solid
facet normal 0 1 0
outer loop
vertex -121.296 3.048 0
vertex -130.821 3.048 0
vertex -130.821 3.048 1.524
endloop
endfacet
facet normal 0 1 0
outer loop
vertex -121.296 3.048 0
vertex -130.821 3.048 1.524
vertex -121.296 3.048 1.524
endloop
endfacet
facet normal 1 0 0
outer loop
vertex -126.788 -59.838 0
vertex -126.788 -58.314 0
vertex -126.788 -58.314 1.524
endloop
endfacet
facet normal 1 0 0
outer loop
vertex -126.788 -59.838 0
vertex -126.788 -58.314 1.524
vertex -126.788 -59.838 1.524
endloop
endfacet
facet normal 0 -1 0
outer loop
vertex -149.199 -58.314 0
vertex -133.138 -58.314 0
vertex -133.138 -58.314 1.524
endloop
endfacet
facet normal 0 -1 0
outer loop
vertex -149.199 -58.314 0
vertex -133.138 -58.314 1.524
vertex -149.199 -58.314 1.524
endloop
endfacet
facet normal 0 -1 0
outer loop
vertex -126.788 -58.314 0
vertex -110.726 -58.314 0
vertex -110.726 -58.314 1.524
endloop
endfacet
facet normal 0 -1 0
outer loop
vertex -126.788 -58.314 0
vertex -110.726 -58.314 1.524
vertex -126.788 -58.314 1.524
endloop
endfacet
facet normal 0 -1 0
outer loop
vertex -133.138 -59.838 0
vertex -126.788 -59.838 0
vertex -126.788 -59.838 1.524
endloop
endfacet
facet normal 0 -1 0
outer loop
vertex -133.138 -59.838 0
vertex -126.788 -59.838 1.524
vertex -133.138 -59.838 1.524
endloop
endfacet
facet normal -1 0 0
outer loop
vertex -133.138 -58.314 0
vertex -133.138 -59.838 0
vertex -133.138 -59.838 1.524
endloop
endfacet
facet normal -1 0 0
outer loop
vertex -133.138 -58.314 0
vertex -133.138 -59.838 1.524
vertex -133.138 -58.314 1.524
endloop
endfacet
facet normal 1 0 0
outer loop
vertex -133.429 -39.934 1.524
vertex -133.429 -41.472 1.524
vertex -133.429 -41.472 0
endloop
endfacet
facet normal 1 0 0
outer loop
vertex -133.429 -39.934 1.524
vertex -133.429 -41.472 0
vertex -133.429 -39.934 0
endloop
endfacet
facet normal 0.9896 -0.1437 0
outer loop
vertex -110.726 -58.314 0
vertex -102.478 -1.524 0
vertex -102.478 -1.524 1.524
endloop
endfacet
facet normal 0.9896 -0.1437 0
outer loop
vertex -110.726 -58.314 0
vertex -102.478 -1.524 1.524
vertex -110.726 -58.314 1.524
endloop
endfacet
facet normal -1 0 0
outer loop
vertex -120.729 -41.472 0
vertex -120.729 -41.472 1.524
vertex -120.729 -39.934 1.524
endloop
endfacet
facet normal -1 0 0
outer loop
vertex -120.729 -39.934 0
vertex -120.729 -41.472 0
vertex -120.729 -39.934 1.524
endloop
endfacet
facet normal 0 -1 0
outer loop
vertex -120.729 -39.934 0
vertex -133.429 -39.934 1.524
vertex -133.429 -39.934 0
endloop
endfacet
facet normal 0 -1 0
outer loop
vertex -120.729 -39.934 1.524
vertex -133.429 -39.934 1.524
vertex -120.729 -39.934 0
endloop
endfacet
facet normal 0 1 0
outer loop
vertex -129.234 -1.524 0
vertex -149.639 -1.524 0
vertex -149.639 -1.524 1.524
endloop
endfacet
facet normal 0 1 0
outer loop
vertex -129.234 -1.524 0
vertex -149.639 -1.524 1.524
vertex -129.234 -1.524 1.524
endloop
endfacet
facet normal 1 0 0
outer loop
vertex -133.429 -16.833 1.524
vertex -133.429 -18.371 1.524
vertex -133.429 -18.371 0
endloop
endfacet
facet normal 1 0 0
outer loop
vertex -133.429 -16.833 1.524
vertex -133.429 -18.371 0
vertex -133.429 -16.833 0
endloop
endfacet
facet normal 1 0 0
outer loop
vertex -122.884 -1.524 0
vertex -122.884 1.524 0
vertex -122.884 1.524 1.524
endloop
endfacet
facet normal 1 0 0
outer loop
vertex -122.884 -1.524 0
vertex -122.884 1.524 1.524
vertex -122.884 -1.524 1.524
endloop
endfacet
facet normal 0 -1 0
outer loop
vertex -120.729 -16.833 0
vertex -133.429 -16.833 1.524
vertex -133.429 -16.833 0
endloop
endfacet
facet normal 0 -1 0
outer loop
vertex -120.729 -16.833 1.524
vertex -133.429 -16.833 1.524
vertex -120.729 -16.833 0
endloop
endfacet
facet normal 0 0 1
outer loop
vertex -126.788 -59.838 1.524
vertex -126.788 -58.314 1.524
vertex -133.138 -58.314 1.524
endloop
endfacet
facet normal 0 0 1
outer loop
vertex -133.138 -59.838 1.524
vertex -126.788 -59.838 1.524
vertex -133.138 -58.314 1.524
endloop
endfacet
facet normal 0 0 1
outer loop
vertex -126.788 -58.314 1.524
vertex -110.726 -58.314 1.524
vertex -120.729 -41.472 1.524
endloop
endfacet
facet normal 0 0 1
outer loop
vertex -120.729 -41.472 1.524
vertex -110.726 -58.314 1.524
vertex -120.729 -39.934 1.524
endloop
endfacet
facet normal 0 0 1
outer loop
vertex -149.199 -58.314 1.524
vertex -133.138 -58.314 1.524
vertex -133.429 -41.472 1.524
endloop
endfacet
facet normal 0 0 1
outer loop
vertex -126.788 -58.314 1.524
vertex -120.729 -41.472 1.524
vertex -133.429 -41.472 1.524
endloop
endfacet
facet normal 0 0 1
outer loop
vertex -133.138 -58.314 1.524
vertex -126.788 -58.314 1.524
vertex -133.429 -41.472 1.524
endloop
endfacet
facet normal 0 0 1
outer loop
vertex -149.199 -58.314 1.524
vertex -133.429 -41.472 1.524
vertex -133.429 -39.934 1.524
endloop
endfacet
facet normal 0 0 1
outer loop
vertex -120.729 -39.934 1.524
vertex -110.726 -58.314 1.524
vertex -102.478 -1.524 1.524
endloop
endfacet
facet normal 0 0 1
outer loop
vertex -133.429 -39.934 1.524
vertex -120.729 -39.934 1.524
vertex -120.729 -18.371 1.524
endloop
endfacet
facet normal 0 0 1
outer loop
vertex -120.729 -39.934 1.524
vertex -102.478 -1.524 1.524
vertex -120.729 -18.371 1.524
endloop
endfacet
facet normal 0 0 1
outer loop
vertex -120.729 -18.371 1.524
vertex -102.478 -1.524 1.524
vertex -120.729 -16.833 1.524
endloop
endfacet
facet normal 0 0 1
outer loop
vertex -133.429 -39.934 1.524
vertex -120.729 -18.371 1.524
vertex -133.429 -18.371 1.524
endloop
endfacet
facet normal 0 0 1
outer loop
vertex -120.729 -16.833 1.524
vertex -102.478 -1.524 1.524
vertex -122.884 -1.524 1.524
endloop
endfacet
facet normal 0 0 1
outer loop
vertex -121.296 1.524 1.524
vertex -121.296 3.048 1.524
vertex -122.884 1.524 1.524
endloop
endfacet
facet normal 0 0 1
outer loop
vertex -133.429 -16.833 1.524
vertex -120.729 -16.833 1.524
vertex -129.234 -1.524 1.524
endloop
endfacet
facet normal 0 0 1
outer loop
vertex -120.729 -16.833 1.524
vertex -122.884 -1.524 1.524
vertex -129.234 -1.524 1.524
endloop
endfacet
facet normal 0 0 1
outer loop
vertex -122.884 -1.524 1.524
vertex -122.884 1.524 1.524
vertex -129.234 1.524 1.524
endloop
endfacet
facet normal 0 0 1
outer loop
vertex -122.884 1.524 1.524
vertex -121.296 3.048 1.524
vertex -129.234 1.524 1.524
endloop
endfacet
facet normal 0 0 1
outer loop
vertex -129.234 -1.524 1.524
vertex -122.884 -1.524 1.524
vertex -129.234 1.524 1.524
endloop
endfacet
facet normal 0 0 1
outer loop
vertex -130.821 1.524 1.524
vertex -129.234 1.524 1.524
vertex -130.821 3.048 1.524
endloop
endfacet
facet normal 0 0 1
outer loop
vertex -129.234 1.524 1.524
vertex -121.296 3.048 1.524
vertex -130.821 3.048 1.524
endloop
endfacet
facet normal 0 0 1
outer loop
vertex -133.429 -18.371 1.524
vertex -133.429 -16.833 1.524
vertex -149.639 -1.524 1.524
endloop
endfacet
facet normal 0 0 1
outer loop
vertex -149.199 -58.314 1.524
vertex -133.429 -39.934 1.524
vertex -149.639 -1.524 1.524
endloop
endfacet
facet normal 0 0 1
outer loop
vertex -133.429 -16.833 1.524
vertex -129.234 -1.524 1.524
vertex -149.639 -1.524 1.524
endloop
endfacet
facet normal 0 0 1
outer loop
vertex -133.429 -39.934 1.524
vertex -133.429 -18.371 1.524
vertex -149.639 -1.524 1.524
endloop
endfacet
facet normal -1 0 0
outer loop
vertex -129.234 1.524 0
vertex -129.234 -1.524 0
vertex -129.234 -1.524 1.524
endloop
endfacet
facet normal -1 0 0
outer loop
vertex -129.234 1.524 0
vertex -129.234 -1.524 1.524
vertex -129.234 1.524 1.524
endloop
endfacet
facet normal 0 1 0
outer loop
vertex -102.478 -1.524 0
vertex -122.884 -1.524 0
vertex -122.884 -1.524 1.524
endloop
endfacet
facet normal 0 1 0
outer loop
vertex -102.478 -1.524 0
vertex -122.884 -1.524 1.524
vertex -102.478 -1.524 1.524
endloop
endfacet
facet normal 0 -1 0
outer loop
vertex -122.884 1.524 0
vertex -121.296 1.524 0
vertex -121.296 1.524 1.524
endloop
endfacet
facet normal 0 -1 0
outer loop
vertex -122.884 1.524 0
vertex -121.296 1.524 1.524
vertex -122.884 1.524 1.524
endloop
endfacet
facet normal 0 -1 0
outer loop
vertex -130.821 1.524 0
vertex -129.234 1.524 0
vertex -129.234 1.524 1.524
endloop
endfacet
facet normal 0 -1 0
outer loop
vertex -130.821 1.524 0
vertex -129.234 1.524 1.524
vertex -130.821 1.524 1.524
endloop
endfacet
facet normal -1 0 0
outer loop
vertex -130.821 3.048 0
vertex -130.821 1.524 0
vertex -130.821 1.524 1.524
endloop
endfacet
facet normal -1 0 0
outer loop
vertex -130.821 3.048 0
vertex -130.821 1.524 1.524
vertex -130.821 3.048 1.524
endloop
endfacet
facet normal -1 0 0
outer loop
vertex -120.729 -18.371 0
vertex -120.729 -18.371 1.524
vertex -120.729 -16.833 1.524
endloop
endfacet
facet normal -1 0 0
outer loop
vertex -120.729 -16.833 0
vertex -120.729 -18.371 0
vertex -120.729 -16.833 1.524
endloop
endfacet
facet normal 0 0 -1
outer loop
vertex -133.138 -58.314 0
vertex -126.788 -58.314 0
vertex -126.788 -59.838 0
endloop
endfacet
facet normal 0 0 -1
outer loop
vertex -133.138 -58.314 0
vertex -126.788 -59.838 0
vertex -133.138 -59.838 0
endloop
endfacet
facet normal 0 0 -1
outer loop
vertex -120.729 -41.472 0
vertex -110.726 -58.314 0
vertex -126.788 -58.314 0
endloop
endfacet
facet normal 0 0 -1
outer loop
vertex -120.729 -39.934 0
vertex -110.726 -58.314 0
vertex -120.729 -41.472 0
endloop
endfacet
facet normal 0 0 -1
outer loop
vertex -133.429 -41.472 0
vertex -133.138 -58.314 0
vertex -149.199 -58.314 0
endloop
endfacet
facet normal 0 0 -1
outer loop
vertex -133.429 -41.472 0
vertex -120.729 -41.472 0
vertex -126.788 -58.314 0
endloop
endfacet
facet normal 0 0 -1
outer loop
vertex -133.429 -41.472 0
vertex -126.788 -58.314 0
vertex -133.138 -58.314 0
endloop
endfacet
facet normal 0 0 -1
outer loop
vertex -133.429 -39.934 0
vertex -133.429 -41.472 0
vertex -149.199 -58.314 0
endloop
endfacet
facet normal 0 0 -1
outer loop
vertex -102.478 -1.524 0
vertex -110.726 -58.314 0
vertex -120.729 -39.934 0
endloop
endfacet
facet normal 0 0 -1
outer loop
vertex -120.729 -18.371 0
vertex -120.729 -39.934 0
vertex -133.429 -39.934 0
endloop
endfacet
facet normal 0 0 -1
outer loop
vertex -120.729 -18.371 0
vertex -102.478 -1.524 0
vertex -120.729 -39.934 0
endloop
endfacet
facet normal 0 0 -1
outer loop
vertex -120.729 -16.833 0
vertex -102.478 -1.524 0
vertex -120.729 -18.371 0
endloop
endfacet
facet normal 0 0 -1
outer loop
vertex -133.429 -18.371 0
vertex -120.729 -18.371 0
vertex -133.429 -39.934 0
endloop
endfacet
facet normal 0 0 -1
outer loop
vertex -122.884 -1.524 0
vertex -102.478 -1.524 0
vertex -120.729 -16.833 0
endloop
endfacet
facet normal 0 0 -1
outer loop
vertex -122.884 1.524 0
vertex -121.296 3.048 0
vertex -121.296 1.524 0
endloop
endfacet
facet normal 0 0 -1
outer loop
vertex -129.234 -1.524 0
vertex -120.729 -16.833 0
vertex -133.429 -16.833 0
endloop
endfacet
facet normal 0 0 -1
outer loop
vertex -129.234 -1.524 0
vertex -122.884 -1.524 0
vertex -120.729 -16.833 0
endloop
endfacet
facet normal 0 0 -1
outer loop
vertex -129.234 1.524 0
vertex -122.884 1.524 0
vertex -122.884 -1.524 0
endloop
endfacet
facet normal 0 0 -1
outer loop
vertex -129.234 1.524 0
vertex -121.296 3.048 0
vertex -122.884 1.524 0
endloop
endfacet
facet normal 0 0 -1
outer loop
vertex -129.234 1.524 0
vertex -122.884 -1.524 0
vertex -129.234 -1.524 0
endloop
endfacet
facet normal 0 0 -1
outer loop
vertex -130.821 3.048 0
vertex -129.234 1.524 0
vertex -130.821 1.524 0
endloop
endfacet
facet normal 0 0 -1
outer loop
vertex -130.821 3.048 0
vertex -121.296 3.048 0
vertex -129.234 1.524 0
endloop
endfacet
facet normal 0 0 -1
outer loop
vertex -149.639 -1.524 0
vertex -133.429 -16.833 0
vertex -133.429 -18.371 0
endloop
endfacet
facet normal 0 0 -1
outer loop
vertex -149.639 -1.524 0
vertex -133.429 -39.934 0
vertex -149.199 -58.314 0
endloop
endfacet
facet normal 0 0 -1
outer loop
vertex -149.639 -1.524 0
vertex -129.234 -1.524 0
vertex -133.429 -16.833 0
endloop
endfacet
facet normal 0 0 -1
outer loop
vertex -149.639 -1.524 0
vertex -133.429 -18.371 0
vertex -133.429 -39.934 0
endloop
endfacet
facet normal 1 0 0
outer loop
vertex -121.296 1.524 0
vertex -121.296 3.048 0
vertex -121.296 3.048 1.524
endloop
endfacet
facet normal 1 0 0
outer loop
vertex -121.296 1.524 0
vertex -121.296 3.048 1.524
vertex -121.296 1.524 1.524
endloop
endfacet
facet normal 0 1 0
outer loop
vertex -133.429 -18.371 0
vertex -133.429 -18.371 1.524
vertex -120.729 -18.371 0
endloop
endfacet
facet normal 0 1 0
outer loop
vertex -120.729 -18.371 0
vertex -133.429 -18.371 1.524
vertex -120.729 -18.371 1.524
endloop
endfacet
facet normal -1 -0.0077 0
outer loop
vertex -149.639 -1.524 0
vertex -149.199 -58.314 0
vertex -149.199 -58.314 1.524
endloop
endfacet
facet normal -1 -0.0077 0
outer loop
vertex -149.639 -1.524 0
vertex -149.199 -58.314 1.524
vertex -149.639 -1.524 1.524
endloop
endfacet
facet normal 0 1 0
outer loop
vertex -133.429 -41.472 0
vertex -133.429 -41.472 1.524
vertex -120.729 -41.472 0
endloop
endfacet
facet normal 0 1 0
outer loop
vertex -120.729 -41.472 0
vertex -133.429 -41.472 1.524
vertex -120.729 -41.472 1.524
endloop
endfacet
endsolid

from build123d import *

# Parameters (mm, degrees)
BOSS_EXTRUDE1_DEPTH = 1.524
SKETCH2_W           = 12.7
SKETCH2_H           = 1.537730424
SKETCH2_H_2         = 1.537730425
CUT_EXTRUDE1_DEPTH  = 1.524


with BuildPart() as part:
    # Sketch1 → Boss-Extrude1 (new body)
    with BuildSketch(Plane.XY):
        Polygon((-102.477755775, -1.524), (-110.726395883, -58.314338926), (-126.787898899, -58.314338926), (-126.787898899, -59.838338926), (-133.137898899, -59.838338926), (-133.137898899, -58.314338926), (-149.199401915, -58.314338926), (-149.6392871, -1.524), (-129.233521437, -1.524), (-129.233521437, 1.524), (-130.821021437, 1.524), (-130.821021437, 3.048), (-121.296021437, 3.048), (-121.296021437, 1.524), (-122.883521437, 1.524), (-122.883521437, -1.524), align=None)
    extrude(amount=BOSS_EXTRUDE1_DEPTH)

    # Sketch2 → Cut-Extrude1 (cut)
    with BuildSketch(Plane.XY.offset(1.524)):
        with Locations((-127.078752717, -17.602011312)):
            Rectangle(SKETCH2_W, SKETCH2_H)
        with Locations((-127.078752717, -40.703047377)):
            Rectangle(SKETCH2_W, SKETCH2_H_2)
    extrude(amount=-CUT_EXTRUDE1_DEPTH, mode=Mode.SUBTRACT)


solid = part.part
